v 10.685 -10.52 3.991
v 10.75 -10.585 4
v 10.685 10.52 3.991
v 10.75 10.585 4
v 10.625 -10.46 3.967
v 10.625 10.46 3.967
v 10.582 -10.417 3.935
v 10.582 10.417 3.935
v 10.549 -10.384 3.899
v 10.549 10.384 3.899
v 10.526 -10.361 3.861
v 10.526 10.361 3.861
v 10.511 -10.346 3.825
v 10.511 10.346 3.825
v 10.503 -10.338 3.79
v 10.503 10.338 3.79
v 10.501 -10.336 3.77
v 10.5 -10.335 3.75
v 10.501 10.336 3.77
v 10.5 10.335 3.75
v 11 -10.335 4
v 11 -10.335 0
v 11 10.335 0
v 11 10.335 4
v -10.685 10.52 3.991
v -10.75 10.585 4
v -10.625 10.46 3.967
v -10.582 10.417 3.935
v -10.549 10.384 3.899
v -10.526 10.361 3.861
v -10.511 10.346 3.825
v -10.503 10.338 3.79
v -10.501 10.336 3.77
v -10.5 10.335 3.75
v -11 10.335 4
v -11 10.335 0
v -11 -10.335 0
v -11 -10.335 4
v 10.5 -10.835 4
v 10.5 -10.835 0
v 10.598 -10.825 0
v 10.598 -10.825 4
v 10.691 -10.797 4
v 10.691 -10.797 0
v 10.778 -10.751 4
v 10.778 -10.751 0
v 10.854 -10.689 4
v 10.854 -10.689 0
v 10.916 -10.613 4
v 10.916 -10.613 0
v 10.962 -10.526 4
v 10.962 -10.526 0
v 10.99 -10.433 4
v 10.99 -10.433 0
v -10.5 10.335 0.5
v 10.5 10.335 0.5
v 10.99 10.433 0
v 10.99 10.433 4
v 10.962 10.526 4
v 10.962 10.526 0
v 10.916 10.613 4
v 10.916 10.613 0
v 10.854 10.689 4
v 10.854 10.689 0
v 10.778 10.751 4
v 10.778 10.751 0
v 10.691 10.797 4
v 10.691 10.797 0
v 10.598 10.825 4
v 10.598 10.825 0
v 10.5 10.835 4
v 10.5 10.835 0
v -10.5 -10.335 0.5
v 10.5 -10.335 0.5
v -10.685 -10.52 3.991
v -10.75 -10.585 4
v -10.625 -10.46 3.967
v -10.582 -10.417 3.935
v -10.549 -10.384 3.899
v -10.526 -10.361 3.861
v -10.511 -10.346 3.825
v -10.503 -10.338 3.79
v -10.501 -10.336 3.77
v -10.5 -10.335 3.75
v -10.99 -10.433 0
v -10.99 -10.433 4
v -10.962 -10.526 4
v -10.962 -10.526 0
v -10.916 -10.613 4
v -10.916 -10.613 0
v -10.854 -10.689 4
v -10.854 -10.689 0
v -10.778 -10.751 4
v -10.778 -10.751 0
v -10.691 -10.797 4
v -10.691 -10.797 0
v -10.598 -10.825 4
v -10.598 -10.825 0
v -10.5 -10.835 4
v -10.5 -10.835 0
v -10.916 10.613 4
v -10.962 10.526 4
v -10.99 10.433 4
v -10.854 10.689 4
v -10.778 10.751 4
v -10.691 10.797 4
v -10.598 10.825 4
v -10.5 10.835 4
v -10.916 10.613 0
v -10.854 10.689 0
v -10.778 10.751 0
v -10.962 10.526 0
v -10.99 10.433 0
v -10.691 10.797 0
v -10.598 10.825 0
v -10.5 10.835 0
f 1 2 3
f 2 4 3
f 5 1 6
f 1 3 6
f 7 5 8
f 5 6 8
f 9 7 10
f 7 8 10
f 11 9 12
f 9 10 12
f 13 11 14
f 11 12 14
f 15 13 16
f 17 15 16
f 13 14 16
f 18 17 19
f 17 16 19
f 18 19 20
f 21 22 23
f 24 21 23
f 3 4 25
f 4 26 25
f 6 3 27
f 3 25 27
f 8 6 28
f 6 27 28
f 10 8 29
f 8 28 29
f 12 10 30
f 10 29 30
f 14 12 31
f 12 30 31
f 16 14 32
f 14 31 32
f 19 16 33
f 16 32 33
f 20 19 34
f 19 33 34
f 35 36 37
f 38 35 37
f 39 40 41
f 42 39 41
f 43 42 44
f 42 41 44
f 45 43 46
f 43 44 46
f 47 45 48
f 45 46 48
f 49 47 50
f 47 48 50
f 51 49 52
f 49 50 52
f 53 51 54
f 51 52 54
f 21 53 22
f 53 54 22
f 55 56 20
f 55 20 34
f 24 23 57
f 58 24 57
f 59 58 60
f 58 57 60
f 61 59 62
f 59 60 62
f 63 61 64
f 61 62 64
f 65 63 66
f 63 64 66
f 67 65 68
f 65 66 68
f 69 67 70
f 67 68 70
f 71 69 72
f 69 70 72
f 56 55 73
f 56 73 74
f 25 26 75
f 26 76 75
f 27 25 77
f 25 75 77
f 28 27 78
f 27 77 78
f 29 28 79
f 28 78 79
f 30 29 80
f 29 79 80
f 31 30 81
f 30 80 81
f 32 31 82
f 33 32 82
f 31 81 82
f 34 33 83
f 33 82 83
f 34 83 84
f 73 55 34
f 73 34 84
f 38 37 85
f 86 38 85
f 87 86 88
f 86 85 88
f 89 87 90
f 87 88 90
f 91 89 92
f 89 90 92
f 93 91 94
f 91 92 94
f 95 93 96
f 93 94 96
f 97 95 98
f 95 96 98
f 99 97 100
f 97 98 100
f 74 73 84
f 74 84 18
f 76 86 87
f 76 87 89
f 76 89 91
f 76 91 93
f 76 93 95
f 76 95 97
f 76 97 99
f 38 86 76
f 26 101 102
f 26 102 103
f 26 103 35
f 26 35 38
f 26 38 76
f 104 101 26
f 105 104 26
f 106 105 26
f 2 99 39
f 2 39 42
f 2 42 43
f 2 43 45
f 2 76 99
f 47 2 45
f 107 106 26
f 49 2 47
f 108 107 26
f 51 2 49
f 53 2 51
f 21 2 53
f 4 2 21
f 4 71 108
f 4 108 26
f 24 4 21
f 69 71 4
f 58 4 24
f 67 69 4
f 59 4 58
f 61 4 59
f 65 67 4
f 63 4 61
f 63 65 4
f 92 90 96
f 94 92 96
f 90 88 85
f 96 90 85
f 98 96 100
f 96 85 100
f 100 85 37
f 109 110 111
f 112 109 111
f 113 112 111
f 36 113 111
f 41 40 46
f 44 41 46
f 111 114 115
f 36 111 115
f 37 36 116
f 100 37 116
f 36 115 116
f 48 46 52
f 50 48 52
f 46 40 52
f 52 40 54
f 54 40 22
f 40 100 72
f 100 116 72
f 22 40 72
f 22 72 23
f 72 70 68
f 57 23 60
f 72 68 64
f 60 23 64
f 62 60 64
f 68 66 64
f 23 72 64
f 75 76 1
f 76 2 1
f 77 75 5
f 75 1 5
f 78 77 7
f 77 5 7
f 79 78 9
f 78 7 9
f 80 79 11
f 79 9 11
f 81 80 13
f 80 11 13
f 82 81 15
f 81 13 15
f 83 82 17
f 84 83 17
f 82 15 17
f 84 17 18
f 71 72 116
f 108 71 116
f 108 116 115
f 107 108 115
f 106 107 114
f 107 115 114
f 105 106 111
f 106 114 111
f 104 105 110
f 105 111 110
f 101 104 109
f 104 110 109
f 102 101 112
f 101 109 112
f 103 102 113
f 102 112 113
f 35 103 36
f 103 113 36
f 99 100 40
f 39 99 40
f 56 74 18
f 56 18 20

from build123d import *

# Parameters (mm, degrees)
F1_DEPTH = 4
F2_T     = 0.5
F3_R     = 0.25


# Not quite as in the source:
# - a shell that OpenCascade refuses in one call is made with other operations: the cavity is built on its own and cut out


with BuildPart() as f1:
    # F0 (on Top) → F1 (new body)
    with BuildSketch(Plane.XY):
        with BuildLine():
            Line((10.5, 10.835), (-10.5, 10.835))
            ThreePointArc((-10.5, 10.835), (-10.8535533906, 10.6885533906), (-11, 10.335))
            Line((-11, 10.335), (-11, -10.335))
            ThreePointArc((-11, -10.335), (-10.8535533906, -10.6885533906), (-10.5, -10.835))
            Line((-10.5, -10.835), (10.5, -10.835))
            ThreePointArc((10.5, -10.835), (10.8535533906, -10.6885533906), (11, -10.335))
            Line((11, -10.335), (11, 10.335))
            ThreePointArc((11, 10.335), (10.8535533906, 10.6885533906), (10.5, 10.835))
        make_face()
    extrude(amount=F1_DEPTH)

    # F2: shell of thickness 0.5, made by hand


with BuildPart() as f2_core1:
    # F2_t2: copy of F1
    add(f1.part)

    # the walls: a layer under each face that stays
    f2_faces = [f2_core1.faces().sort_by_distance(p)[0] for p in [
        (0, 10.835, 2),
        (-11, 0, 2),
        (0, -10.835, 2),
        (11, 0, 2),
        (0, 0, 0),
    ]]
    thicken(f2_faces, amount=-F2_T, mode=Mode.SUBTRACT)


with BuildPart() as f1_1:
    add(f1.part)

    # what is left inside the walls is the cavity
    f2_cavity = [f2_core1.part.solids().sort_by_distance(p)[0] for p in [
        (0, -3.445, 0.505),
    ]]
    add(f2_cavity, mode=Mode.SUBTRACT)

    # F3
    f3_edges = [f1_1.edges().sort_by_distance(p)[0] for p in [
        (10.5, 0, 4),
        (0, 10.335, 4),
        (-10.5, 0, 4),
        (0, -10.335, 4),
    ]]
    fillet(f3_edges, radius=F3_R)


solid = f1_1.part
